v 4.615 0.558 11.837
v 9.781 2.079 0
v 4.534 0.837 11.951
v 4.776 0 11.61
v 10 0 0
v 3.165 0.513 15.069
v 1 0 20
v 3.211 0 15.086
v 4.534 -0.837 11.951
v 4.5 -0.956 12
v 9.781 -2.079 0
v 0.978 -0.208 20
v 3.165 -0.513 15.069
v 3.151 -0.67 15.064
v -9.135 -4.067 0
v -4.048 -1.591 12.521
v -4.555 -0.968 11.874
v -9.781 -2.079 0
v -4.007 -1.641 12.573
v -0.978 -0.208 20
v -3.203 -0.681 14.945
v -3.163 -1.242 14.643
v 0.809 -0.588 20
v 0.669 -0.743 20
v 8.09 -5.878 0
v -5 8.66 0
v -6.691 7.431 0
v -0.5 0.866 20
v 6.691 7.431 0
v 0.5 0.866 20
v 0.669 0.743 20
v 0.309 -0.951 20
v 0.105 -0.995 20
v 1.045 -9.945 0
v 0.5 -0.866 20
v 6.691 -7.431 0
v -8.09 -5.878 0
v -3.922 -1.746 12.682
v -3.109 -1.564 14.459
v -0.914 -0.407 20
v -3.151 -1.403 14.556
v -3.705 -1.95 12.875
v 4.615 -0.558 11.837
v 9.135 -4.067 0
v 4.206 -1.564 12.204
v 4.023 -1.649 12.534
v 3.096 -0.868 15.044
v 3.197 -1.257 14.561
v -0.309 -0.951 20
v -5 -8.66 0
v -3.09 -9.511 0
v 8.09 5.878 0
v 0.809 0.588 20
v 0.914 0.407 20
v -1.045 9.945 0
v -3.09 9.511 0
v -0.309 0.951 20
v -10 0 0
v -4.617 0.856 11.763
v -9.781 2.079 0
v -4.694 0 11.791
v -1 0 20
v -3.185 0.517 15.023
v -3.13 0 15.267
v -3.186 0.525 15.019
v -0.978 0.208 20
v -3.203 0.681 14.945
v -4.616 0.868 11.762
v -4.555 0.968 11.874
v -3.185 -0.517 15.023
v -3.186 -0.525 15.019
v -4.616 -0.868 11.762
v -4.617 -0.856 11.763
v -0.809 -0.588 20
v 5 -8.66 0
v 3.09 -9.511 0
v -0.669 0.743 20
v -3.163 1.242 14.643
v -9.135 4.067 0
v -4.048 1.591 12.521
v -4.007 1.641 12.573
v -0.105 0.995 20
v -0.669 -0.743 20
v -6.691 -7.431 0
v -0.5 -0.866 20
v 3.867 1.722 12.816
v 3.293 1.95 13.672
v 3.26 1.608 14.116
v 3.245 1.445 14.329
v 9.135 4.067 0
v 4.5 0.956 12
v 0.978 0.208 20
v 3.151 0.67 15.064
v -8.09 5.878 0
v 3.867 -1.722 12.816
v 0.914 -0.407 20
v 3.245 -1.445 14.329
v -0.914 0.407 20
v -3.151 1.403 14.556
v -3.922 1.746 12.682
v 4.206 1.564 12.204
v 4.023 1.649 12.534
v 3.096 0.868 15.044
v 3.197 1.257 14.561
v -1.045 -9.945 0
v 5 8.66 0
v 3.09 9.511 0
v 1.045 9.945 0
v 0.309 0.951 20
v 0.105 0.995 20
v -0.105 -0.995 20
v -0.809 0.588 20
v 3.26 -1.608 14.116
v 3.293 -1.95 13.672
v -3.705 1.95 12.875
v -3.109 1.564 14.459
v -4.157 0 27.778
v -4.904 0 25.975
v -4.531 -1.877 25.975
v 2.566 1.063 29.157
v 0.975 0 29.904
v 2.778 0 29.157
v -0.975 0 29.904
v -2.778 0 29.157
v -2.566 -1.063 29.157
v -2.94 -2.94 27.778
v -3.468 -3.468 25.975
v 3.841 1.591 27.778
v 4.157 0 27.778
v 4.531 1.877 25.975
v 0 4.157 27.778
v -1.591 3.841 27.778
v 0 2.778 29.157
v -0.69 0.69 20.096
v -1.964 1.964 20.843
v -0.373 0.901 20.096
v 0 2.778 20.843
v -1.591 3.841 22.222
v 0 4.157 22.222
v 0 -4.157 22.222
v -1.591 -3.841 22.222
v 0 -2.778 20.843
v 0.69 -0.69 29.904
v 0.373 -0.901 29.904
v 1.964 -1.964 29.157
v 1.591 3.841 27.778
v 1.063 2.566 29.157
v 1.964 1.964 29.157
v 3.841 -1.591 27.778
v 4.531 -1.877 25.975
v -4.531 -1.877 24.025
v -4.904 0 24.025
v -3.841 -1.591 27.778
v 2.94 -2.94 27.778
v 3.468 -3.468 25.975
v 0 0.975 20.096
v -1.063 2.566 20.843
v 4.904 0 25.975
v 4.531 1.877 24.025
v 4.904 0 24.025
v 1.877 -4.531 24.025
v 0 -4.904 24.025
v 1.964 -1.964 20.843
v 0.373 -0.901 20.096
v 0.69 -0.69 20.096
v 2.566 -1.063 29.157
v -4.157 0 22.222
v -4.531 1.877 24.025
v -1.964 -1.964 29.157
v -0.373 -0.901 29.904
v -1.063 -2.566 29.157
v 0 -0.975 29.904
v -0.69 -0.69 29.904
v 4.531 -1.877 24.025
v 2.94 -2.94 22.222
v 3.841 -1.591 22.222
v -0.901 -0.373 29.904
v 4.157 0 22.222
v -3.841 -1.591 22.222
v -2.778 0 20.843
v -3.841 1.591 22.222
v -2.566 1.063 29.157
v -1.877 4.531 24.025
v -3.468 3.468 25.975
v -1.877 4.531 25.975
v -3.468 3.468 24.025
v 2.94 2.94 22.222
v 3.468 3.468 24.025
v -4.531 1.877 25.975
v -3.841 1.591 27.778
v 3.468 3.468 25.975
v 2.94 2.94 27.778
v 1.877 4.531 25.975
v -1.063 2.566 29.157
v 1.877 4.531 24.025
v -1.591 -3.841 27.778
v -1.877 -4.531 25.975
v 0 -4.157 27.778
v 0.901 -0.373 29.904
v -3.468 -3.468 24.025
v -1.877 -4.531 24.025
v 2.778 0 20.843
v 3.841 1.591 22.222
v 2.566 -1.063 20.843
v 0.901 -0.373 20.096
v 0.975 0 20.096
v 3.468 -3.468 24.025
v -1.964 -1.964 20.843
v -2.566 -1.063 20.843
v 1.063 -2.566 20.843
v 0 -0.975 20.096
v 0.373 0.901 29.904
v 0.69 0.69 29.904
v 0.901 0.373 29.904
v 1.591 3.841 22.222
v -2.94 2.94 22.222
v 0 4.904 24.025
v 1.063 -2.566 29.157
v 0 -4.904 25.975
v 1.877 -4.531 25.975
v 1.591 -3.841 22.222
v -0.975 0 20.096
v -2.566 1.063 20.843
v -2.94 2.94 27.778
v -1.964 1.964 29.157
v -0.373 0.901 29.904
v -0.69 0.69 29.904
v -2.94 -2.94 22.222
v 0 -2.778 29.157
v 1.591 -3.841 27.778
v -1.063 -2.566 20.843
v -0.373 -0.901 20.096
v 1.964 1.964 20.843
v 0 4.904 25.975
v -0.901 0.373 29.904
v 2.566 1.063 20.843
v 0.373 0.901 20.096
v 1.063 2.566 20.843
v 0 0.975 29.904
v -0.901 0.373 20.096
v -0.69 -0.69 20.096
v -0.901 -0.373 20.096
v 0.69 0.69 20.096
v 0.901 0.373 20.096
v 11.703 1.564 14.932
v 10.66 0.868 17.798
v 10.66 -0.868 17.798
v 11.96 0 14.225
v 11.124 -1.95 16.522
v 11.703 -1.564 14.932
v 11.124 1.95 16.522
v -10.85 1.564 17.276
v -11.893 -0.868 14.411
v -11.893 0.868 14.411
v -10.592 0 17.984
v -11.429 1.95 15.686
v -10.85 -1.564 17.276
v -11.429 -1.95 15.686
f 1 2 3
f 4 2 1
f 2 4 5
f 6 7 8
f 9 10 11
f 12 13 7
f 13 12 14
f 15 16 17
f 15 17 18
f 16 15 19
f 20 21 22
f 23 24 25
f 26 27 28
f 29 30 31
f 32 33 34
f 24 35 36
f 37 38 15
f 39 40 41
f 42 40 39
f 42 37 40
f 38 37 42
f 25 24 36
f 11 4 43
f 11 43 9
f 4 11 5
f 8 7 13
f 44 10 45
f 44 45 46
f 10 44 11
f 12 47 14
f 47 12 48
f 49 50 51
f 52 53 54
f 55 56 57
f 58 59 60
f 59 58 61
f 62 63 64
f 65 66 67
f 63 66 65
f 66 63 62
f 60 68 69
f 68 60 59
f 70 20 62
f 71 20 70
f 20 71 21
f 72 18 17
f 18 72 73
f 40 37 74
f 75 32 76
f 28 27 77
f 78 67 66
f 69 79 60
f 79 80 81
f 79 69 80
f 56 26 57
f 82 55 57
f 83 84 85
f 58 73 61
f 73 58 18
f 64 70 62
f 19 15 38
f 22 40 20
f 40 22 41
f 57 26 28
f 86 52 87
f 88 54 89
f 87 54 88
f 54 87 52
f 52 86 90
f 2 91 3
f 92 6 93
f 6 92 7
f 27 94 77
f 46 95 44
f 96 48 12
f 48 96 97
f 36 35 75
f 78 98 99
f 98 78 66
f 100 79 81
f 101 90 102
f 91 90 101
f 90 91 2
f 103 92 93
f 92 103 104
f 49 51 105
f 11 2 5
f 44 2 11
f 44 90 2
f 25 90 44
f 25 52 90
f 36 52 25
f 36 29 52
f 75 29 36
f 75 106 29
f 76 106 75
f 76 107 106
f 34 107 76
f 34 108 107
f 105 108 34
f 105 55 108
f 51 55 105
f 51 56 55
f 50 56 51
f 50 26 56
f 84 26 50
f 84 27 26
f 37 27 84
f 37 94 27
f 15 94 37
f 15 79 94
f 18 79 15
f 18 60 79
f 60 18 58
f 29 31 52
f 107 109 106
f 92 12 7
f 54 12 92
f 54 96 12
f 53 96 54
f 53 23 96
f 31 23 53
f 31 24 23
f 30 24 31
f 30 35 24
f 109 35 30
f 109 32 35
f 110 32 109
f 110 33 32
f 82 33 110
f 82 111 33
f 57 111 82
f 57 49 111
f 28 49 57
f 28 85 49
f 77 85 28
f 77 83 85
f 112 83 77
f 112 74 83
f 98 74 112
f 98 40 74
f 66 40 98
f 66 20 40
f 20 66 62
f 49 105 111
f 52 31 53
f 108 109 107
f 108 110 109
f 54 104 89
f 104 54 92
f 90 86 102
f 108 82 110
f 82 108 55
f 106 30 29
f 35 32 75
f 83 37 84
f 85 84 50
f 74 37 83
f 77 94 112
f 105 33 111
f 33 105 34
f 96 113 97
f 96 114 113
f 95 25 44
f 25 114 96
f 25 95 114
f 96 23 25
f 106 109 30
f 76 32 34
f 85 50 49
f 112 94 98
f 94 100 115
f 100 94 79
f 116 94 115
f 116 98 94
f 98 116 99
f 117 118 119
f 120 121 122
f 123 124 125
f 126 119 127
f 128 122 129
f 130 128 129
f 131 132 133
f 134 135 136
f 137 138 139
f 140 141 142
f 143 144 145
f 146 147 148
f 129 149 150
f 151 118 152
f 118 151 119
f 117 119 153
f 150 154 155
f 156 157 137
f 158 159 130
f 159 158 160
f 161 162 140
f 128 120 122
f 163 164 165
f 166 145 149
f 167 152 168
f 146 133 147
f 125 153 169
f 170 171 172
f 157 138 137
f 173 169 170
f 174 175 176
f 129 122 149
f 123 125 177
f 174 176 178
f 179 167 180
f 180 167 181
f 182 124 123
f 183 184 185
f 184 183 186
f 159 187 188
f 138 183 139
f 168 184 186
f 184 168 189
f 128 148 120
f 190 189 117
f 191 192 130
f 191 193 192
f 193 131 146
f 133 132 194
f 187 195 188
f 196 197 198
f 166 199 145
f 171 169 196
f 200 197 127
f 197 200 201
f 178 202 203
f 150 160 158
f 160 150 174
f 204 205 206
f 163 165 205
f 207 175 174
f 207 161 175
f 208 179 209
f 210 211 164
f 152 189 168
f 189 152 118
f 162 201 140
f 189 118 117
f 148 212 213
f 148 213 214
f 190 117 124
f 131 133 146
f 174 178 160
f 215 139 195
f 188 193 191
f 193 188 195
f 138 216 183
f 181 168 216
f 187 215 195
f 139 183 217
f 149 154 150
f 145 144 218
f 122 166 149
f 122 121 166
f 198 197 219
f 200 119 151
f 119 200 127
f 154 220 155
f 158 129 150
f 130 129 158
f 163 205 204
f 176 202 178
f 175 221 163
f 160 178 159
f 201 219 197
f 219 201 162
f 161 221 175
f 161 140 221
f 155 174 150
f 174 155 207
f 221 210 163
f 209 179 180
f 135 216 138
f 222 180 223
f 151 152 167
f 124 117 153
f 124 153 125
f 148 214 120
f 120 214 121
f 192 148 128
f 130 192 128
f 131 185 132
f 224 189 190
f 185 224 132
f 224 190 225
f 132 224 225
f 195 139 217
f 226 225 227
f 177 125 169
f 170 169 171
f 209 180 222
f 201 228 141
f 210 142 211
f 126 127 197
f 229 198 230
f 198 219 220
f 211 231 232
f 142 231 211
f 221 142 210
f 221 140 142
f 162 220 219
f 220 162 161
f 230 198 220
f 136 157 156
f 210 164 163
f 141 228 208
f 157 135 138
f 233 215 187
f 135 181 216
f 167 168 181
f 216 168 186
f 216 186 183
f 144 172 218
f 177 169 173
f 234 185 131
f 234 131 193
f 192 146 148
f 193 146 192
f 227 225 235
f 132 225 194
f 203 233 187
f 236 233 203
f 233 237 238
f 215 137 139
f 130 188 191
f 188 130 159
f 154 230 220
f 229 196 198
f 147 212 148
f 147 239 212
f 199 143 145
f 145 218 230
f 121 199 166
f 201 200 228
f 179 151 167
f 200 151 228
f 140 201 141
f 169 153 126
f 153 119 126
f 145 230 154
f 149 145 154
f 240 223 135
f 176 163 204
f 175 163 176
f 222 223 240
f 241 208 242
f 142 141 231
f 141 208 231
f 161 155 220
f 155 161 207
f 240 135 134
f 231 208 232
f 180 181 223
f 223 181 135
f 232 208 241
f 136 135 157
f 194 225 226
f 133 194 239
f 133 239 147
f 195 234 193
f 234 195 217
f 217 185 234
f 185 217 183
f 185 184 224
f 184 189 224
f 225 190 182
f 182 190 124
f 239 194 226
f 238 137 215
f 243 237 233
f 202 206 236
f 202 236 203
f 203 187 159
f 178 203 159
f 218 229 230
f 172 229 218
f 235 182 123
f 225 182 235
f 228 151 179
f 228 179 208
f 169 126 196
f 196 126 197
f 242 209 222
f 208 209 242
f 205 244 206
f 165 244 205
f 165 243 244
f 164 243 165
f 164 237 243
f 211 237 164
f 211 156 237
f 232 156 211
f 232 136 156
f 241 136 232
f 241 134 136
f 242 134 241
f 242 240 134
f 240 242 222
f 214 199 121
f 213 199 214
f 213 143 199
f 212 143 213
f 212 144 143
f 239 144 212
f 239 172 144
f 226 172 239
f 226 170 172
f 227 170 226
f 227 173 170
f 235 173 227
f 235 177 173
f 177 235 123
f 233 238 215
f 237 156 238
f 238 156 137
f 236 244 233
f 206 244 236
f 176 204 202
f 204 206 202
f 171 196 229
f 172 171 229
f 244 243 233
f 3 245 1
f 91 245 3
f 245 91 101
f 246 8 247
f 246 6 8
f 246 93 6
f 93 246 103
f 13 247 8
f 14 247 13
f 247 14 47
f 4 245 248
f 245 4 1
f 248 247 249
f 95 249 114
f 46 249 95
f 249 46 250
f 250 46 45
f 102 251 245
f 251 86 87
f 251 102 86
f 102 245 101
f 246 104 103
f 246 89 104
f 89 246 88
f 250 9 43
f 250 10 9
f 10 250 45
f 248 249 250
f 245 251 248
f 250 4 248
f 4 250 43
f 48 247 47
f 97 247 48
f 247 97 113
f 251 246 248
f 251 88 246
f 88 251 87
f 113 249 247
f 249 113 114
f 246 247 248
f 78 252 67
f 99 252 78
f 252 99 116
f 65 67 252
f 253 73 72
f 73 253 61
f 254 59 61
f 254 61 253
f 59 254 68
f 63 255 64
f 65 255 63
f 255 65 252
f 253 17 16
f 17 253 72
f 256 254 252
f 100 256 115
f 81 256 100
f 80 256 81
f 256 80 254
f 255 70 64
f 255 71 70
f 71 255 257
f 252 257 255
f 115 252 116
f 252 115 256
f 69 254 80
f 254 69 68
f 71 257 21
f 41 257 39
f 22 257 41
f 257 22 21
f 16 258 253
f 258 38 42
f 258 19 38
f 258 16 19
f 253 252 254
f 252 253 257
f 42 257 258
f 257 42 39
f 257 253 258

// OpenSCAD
cylinder(h=20, d1=20, d2=2);


translate([0,0,25]){
    sphere(r=5);
}

translate([0,0,12]) {
    rotate([0,70,0]){
        cylinder(12,2,2);
    }
}

translate([0,0,12]) {
    rotate([0,-70,0]){
        cylinder(12,2,2);
    }
}
